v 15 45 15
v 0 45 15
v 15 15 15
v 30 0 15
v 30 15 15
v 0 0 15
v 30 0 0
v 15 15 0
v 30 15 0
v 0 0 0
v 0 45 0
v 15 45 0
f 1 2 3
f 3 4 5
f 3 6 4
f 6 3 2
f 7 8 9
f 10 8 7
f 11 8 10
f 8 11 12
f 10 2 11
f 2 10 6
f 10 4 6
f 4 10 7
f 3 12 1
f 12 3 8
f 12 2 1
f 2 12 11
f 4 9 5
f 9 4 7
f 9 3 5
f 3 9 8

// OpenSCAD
// Fongo piece 16: L. GPL-3.0; see README.txt.
// All cube positions derive from the canonical catalogue. z points up.
unit = 15; // mm, scale all pieces AND cards together
positions = [[0,0,0],[0,1,0],[0,2,0],[1,0,0]];
union() { for (p = positions) translate(p * unit) cube([unit, unit, unit]); }
